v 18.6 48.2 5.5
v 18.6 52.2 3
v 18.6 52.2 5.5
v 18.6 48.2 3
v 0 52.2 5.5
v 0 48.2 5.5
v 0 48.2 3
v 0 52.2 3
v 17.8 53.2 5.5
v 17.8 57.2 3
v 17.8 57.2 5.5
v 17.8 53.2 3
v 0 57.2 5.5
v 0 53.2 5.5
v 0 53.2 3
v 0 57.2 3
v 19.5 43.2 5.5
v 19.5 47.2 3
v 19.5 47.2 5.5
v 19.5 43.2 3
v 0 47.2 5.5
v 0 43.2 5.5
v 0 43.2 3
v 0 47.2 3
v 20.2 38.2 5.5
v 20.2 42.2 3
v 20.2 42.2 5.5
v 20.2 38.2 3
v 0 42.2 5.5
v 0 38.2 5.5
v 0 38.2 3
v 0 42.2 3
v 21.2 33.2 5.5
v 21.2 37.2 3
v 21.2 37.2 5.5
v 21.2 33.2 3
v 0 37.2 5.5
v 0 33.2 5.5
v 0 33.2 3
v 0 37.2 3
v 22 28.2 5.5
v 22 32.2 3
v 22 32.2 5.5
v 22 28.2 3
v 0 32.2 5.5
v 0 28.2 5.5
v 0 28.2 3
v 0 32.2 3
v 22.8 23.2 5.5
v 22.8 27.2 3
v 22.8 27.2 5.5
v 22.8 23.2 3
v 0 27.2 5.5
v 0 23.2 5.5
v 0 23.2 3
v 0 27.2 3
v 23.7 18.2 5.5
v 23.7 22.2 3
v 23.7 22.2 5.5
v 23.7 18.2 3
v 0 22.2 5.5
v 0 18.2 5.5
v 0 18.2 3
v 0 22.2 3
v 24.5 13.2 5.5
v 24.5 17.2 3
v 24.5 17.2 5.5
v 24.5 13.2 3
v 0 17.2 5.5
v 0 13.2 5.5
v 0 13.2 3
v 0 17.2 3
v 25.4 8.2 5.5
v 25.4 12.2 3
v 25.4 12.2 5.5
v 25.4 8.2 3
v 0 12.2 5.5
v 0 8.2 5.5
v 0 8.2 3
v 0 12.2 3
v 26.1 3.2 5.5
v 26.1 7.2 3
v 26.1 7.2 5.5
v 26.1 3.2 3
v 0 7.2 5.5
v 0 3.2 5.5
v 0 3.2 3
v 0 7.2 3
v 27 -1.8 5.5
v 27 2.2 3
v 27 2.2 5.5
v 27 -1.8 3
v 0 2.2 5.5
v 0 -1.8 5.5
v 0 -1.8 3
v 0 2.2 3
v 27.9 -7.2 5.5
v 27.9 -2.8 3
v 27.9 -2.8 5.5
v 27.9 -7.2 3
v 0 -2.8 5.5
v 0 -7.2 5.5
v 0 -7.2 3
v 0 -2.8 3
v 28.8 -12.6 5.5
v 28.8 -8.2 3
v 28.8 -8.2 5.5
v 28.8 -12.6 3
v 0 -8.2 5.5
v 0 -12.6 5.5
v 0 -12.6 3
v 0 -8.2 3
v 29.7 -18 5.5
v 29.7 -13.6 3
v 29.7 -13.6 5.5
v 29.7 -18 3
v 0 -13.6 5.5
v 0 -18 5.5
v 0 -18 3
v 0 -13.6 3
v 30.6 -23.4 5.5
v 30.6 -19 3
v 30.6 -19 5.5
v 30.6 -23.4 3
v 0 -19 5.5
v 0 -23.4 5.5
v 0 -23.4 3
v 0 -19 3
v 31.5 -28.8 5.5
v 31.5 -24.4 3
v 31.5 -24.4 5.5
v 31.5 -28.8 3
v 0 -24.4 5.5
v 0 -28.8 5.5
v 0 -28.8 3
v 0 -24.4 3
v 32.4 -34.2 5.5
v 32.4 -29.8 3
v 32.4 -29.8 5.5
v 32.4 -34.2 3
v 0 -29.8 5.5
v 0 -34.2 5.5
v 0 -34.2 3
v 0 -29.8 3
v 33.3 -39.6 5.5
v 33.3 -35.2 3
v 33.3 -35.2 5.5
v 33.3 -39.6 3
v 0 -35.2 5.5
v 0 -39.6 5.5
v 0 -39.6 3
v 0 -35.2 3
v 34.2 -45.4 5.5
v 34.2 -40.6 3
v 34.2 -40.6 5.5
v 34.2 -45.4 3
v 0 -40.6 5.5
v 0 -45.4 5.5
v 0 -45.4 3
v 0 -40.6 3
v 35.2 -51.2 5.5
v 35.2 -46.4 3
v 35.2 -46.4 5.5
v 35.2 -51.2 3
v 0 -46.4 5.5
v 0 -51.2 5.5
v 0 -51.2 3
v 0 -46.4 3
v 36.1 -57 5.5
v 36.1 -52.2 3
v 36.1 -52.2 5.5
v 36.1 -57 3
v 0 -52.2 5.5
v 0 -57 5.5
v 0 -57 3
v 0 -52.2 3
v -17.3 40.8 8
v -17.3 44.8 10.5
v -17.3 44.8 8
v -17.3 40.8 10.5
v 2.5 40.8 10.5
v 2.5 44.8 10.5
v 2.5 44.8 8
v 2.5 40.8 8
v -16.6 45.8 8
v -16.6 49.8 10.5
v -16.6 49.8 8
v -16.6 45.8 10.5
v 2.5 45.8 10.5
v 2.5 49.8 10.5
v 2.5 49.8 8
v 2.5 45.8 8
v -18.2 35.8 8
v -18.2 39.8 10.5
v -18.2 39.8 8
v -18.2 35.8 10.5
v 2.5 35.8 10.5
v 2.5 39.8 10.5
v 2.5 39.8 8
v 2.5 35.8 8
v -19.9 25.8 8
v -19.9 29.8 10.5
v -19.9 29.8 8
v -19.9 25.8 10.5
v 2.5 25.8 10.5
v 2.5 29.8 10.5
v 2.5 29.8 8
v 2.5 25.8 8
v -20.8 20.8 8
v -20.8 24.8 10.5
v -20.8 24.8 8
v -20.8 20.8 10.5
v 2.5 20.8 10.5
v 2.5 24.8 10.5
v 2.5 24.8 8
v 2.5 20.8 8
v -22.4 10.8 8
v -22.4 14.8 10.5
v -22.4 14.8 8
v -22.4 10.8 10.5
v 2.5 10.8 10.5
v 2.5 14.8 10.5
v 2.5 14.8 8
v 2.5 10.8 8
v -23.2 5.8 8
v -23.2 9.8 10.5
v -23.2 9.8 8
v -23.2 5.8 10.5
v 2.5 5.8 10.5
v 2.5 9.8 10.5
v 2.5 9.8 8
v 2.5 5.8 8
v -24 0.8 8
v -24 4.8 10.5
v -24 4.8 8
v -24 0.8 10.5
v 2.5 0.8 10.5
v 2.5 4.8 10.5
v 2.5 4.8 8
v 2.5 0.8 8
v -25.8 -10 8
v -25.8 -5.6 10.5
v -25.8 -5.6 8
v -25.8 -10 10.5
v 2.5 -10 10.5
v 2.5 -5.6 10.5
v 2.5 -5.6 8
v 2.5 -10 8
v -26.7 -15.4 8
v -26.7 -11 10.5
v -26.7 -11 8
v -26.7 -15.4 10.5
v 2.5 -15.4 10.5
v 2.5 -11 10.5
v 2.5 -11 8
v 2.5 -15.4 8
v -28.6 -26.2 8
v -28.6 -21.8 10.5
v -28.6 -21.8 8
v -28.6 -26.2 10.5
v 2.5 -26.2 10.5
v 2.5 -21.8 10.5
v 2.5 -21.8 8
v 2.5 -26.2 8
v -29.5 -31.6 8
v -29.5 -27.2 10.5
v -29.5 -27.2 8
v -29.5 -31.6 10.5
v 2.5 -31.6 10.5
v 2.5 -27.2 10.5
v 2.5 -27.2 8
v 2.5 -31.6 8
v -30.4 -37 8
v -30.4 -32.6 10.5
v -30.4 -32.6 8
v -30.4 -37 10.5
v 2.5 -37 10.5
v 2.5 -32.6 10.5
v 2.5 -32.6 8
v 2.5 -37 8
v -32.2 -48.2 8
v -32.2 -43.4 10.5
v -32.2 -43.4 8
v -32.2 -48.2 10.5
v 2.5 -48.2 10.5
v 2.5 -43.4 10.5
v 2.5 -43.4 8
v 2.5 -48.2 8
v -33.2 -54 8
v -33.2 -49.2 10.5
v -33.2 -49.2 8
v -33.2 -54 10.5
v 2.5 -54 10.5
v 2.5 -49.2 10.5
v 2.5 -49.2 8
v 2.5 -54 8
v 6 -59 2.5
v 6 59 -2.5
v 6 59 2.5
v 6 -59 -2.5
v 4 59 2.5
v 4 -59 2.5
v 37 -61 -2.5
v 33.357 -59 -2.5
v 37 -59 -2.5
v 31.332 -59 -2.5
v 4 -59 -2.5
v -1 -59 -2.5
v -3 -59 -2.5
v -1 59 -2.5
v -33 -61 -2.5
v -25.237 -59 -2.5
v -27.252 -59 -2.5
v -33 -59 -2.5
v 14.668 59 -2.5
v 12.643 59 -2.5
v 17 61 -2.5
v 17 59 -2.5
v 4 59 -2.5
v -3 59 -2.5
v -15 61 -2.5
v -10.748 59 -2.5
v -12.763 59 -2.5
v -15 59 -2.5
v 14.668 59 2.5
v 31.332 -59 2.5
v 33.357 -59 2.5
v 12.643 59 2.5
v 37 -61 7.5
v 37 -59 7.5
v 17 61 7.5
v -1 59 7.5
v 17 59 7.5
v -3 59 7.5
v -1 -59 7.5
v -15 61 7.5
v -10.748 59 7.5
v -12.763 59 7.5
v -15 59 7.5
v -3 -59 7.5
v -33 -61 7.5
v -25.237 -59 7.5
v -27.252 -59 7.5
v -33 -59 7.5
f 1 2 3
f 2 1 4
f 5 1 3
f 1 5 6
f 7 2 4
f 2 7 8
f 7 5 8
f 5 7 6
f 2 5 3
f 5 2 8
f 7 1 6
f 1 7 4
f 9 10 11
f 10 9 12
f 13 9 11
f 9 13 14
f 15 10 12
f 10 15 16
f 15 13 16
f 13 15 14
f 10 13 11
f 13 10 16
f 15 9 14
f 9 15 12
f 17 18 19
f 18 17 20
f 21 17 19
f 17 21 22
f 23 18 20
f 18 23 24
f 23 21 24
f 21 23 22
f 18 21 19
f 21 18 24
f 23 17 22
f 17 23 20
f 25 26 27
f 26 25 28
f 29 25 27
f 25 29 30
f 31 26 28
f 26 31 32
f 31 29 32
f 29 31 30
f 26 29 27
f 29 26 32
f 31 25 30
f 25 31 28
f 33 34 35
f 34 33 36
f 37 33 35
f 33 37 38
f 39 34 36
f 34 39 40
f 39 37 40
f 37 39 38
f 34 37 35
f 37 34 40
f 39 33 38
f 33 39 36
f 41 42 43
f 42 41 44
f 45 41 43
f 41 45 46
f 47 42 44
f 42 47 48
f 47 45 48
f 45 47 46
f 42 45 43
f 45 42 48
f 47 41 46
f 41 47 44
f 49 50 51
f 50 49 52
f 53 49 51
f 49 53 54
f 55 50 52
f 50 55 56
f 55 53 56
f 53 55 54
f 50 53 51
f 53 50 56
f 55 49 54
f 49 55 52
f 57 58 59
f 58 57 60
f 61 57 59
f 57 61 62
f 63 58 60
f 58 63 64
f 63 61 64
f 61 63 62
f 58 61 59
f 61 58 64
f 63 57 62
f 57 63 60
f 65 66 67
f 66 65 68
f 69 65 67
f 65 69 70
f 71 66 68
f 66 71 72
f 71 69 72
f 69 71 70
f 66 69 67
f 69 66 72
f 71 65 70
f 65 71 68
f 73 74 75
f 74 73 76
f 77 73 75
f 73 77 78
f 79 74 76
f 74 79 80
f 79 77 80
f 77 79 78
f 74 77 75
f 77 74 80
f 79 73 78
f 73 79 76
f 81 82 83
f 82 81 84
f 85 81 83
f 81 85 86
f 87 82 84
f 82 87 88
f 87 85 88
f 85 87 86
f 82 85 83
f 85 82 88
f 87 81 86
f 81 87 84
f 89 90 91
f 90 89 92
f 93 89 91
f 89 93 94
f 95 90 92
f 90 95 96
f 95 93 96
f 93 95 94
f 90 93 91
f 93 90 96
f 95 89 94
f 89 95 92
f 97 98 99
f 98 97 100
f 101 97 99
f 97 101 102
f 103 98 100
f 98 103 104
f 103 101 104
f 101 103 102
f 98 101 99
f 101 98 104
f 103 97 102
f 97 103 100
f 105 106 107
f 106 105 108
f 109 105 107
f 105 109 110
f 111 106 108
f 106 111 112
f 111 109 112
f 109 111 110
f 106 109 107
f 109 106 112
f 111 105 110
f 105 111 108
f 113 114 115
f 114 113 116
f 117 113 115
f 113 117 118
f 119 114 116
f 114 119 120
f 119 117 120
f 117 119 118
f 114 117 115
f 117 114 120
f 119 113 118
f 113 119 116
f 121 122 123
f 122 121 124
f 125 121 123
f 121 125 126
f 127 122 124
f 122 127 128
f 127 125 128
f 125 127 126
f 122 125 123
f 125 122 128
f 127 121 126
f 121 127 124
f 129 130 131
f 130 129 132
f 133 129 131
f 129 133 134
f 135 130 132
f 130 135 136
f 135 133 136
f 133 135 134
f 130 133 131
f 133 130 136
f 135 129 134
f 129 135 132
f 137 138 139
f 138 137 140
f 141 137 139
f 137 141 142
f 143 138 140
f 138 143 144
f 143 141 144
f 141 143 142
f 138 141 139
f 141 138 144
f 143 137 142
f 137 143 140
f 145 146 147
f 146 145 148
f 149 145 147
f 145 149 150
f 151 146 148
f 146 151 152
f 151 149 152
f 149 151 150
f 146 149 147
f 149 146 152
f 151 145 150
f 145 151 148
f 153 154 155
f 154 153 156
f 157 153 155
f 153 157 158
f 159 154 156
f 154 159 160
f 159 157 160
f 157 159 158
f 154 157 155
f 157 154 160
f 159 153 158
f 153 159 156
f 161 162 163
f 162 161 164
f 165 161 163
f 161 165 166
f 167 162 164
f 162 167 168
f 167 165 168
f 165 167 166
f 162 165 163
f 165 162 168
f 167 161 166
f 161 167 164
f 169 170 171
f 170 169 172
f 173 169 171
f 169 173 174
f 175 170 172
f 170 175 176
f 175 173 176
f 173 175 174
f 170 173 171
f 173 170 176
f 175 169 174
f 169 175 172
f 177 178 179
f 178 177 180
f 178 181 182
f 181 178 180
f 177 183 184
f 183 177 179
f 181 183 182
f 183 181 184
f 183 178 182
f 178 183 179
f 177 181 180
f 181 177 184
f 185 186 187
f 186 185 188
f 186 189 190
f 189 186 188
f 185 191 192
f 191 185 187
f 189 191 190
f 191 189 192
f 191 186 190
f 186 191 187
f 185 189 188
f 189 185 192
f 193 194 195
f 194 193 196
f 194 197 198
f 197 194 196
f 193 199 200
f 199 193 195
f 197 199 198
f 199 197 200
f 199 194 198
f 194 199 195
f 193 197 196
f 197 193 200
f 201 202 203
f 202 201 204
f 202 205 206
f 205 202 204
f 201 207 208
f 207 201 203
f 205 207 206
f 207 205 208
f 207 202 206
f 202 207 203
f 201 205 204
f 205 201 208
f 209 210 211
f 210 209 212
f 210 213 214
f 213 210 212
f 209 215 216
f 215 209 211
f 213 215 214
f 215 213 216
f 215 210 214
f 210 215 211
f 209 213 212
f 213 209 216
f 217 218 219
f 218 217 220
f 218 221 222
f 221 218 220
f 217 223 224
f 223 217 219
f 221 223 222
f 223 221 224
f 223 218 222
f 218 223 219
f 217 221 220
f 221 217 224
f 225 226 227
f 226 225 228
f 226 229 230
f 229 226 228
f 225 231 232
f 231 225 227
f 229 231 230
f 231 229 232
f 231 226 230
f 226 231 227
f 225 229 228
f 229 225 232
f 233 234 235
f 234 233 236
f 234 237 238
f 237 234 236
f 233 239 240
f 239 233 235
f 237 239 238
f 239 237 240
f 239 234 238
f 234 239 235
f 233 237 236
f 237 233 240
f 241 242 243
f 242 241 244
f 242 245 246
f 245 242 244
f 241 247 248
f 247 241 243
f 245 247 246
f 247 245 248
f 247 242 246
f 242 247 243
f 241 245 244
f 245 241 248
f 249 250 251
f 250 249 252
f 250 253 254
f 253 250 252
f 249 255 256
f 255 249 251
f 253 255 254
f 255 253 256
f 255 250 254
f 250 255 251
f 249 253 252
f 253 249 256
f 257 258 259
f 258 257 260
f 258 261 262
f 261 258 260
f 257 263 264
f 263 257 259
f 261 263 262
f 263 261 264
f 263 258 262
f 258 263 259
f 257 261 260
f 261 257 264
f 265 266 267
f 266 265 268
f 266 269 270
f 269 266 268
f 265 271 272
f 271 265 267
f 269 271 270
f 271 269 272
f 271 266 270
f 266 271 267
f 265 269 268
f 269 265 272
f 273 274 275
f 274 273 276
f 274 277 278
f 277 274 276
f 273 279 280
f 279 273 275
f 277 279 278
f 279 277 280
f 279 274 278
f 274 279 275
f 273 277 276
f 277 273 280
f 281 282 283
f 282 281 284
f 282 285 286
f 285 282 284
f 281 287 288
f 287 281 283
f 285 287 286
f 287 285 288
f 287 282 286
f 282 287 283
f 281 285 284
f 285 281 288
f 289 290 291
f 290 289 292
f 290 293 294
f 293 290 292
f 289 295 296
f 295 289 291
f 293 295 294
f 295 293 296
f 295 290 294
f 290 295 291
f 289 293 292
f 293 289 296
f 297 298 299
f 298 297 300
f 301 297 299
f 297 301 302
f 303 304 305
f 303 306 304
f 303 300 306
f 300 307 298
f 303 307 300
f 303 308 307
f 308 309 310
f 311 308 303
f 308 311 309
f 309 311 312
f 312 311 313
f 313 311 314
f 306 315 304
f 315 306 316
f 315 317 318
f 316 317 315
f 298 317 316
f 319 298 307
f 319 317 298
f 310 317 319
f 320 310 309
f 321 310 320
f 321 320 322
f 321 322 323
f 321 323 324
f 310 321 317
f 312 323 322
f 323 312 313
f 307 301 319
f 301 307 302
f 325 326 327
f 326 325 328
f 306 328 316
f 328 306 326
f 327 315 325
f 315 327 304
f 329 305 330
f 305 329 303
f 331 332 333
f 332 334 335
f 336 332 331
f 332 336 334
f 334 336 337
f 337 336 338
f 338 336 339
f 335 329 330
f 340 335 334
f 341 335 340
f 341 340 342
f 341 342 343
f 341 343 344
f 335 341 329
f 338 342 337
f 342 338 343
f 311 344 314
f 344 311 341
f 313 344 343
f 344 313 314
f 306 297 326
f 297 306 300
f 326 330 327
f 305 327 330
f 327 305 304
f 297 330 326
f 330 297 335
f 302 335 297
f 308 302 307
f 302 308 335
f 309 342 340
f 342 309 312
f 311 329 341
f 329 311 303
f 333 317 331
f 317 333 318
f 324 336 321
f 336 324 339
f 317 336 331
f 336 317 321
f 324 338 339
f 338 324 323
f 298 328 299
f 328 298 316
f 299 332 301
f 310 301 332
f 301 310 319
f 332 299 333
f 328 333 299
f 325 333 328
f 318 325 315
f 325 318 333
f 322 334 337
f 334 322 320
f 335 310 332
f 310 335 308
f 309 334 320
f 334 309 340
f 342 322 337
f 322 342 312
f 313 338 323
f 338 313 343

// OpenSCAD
x = 0;

translate([5,0,0])
  cube([2,120,5],true);

translate([23,0,0])
  rotate([0,0,9])
    cube([2,120,5],true);

translate([2,-60,2.5])
  cube([70,2,10],true);

translate([1,60,2.5])
  cube([32,2,10],true);
  
color("maroon",1.0)
  translate([0,-57,3])
    bar(0,white);

color("maroon",1,0)
  translate([2.5,-57,8])
    mirror([1,0,0])
      bar(0,black);

translate([-2,0,2.5])
  cube([2,120,10],true);

translate([-19,0,2.5])
rotate([0,0,-7])
  cube([2,120,10],true);

module bar(n,k) {
    if (n < len(k)) {
        cube([k[n][0],k[n][1],2.5], false);
        translate([0,k[n][1]+1,0])
          bar(n+1,k);
    }
}

white = [ [36.1,4.8]
        , [35.2,4.8]
        , [34.2,4.8]
        , [33.3,4.4]
        , [32.4,4.4]
        , [31.5,4.4]
        , [30.6,4.4]
        , [29.7,4.4]
        , [28.8,4.4]
        , [27.9,4.4]
        , [27.0,4.0]
        , [26.1,4.0]
        , [25.4,4.0]
        , [24.5,4.0]
        , [23.7,4.0]
        , [22.8,4.0]
        , [22.0,4.0]
        , [21.2,4.0]
        , [20.2,4.0]
        , [19.5,4.0]
        , [18.6,4.0]
        , [17.8,4.0]
        ];
        
black = [ [ 0.0,2]
        , [35.7,4.8]
        , [34.7,4.8]
        , [ 0.0,4.4]
        , [32.9,4.4]
        , [32.0,4.4]
        , [31.1,4.4]
        , [ 0.0,4.4]
        , [29.2,4.4]
        , [28.3,4.4]
        , [ 0.0,4.4]
        , [26.5,4.0]
        , [25.7,4.0]
        , [24.9,4.0]
        , [ 0.0,4.0]
        , [23.3,4.0]
        , [22.4,4.0]
        , [ 0.0,4.0]
        , [20.7,4.0]
        , [19.8,4.0]
        , [19.1,4.0]
        ];
